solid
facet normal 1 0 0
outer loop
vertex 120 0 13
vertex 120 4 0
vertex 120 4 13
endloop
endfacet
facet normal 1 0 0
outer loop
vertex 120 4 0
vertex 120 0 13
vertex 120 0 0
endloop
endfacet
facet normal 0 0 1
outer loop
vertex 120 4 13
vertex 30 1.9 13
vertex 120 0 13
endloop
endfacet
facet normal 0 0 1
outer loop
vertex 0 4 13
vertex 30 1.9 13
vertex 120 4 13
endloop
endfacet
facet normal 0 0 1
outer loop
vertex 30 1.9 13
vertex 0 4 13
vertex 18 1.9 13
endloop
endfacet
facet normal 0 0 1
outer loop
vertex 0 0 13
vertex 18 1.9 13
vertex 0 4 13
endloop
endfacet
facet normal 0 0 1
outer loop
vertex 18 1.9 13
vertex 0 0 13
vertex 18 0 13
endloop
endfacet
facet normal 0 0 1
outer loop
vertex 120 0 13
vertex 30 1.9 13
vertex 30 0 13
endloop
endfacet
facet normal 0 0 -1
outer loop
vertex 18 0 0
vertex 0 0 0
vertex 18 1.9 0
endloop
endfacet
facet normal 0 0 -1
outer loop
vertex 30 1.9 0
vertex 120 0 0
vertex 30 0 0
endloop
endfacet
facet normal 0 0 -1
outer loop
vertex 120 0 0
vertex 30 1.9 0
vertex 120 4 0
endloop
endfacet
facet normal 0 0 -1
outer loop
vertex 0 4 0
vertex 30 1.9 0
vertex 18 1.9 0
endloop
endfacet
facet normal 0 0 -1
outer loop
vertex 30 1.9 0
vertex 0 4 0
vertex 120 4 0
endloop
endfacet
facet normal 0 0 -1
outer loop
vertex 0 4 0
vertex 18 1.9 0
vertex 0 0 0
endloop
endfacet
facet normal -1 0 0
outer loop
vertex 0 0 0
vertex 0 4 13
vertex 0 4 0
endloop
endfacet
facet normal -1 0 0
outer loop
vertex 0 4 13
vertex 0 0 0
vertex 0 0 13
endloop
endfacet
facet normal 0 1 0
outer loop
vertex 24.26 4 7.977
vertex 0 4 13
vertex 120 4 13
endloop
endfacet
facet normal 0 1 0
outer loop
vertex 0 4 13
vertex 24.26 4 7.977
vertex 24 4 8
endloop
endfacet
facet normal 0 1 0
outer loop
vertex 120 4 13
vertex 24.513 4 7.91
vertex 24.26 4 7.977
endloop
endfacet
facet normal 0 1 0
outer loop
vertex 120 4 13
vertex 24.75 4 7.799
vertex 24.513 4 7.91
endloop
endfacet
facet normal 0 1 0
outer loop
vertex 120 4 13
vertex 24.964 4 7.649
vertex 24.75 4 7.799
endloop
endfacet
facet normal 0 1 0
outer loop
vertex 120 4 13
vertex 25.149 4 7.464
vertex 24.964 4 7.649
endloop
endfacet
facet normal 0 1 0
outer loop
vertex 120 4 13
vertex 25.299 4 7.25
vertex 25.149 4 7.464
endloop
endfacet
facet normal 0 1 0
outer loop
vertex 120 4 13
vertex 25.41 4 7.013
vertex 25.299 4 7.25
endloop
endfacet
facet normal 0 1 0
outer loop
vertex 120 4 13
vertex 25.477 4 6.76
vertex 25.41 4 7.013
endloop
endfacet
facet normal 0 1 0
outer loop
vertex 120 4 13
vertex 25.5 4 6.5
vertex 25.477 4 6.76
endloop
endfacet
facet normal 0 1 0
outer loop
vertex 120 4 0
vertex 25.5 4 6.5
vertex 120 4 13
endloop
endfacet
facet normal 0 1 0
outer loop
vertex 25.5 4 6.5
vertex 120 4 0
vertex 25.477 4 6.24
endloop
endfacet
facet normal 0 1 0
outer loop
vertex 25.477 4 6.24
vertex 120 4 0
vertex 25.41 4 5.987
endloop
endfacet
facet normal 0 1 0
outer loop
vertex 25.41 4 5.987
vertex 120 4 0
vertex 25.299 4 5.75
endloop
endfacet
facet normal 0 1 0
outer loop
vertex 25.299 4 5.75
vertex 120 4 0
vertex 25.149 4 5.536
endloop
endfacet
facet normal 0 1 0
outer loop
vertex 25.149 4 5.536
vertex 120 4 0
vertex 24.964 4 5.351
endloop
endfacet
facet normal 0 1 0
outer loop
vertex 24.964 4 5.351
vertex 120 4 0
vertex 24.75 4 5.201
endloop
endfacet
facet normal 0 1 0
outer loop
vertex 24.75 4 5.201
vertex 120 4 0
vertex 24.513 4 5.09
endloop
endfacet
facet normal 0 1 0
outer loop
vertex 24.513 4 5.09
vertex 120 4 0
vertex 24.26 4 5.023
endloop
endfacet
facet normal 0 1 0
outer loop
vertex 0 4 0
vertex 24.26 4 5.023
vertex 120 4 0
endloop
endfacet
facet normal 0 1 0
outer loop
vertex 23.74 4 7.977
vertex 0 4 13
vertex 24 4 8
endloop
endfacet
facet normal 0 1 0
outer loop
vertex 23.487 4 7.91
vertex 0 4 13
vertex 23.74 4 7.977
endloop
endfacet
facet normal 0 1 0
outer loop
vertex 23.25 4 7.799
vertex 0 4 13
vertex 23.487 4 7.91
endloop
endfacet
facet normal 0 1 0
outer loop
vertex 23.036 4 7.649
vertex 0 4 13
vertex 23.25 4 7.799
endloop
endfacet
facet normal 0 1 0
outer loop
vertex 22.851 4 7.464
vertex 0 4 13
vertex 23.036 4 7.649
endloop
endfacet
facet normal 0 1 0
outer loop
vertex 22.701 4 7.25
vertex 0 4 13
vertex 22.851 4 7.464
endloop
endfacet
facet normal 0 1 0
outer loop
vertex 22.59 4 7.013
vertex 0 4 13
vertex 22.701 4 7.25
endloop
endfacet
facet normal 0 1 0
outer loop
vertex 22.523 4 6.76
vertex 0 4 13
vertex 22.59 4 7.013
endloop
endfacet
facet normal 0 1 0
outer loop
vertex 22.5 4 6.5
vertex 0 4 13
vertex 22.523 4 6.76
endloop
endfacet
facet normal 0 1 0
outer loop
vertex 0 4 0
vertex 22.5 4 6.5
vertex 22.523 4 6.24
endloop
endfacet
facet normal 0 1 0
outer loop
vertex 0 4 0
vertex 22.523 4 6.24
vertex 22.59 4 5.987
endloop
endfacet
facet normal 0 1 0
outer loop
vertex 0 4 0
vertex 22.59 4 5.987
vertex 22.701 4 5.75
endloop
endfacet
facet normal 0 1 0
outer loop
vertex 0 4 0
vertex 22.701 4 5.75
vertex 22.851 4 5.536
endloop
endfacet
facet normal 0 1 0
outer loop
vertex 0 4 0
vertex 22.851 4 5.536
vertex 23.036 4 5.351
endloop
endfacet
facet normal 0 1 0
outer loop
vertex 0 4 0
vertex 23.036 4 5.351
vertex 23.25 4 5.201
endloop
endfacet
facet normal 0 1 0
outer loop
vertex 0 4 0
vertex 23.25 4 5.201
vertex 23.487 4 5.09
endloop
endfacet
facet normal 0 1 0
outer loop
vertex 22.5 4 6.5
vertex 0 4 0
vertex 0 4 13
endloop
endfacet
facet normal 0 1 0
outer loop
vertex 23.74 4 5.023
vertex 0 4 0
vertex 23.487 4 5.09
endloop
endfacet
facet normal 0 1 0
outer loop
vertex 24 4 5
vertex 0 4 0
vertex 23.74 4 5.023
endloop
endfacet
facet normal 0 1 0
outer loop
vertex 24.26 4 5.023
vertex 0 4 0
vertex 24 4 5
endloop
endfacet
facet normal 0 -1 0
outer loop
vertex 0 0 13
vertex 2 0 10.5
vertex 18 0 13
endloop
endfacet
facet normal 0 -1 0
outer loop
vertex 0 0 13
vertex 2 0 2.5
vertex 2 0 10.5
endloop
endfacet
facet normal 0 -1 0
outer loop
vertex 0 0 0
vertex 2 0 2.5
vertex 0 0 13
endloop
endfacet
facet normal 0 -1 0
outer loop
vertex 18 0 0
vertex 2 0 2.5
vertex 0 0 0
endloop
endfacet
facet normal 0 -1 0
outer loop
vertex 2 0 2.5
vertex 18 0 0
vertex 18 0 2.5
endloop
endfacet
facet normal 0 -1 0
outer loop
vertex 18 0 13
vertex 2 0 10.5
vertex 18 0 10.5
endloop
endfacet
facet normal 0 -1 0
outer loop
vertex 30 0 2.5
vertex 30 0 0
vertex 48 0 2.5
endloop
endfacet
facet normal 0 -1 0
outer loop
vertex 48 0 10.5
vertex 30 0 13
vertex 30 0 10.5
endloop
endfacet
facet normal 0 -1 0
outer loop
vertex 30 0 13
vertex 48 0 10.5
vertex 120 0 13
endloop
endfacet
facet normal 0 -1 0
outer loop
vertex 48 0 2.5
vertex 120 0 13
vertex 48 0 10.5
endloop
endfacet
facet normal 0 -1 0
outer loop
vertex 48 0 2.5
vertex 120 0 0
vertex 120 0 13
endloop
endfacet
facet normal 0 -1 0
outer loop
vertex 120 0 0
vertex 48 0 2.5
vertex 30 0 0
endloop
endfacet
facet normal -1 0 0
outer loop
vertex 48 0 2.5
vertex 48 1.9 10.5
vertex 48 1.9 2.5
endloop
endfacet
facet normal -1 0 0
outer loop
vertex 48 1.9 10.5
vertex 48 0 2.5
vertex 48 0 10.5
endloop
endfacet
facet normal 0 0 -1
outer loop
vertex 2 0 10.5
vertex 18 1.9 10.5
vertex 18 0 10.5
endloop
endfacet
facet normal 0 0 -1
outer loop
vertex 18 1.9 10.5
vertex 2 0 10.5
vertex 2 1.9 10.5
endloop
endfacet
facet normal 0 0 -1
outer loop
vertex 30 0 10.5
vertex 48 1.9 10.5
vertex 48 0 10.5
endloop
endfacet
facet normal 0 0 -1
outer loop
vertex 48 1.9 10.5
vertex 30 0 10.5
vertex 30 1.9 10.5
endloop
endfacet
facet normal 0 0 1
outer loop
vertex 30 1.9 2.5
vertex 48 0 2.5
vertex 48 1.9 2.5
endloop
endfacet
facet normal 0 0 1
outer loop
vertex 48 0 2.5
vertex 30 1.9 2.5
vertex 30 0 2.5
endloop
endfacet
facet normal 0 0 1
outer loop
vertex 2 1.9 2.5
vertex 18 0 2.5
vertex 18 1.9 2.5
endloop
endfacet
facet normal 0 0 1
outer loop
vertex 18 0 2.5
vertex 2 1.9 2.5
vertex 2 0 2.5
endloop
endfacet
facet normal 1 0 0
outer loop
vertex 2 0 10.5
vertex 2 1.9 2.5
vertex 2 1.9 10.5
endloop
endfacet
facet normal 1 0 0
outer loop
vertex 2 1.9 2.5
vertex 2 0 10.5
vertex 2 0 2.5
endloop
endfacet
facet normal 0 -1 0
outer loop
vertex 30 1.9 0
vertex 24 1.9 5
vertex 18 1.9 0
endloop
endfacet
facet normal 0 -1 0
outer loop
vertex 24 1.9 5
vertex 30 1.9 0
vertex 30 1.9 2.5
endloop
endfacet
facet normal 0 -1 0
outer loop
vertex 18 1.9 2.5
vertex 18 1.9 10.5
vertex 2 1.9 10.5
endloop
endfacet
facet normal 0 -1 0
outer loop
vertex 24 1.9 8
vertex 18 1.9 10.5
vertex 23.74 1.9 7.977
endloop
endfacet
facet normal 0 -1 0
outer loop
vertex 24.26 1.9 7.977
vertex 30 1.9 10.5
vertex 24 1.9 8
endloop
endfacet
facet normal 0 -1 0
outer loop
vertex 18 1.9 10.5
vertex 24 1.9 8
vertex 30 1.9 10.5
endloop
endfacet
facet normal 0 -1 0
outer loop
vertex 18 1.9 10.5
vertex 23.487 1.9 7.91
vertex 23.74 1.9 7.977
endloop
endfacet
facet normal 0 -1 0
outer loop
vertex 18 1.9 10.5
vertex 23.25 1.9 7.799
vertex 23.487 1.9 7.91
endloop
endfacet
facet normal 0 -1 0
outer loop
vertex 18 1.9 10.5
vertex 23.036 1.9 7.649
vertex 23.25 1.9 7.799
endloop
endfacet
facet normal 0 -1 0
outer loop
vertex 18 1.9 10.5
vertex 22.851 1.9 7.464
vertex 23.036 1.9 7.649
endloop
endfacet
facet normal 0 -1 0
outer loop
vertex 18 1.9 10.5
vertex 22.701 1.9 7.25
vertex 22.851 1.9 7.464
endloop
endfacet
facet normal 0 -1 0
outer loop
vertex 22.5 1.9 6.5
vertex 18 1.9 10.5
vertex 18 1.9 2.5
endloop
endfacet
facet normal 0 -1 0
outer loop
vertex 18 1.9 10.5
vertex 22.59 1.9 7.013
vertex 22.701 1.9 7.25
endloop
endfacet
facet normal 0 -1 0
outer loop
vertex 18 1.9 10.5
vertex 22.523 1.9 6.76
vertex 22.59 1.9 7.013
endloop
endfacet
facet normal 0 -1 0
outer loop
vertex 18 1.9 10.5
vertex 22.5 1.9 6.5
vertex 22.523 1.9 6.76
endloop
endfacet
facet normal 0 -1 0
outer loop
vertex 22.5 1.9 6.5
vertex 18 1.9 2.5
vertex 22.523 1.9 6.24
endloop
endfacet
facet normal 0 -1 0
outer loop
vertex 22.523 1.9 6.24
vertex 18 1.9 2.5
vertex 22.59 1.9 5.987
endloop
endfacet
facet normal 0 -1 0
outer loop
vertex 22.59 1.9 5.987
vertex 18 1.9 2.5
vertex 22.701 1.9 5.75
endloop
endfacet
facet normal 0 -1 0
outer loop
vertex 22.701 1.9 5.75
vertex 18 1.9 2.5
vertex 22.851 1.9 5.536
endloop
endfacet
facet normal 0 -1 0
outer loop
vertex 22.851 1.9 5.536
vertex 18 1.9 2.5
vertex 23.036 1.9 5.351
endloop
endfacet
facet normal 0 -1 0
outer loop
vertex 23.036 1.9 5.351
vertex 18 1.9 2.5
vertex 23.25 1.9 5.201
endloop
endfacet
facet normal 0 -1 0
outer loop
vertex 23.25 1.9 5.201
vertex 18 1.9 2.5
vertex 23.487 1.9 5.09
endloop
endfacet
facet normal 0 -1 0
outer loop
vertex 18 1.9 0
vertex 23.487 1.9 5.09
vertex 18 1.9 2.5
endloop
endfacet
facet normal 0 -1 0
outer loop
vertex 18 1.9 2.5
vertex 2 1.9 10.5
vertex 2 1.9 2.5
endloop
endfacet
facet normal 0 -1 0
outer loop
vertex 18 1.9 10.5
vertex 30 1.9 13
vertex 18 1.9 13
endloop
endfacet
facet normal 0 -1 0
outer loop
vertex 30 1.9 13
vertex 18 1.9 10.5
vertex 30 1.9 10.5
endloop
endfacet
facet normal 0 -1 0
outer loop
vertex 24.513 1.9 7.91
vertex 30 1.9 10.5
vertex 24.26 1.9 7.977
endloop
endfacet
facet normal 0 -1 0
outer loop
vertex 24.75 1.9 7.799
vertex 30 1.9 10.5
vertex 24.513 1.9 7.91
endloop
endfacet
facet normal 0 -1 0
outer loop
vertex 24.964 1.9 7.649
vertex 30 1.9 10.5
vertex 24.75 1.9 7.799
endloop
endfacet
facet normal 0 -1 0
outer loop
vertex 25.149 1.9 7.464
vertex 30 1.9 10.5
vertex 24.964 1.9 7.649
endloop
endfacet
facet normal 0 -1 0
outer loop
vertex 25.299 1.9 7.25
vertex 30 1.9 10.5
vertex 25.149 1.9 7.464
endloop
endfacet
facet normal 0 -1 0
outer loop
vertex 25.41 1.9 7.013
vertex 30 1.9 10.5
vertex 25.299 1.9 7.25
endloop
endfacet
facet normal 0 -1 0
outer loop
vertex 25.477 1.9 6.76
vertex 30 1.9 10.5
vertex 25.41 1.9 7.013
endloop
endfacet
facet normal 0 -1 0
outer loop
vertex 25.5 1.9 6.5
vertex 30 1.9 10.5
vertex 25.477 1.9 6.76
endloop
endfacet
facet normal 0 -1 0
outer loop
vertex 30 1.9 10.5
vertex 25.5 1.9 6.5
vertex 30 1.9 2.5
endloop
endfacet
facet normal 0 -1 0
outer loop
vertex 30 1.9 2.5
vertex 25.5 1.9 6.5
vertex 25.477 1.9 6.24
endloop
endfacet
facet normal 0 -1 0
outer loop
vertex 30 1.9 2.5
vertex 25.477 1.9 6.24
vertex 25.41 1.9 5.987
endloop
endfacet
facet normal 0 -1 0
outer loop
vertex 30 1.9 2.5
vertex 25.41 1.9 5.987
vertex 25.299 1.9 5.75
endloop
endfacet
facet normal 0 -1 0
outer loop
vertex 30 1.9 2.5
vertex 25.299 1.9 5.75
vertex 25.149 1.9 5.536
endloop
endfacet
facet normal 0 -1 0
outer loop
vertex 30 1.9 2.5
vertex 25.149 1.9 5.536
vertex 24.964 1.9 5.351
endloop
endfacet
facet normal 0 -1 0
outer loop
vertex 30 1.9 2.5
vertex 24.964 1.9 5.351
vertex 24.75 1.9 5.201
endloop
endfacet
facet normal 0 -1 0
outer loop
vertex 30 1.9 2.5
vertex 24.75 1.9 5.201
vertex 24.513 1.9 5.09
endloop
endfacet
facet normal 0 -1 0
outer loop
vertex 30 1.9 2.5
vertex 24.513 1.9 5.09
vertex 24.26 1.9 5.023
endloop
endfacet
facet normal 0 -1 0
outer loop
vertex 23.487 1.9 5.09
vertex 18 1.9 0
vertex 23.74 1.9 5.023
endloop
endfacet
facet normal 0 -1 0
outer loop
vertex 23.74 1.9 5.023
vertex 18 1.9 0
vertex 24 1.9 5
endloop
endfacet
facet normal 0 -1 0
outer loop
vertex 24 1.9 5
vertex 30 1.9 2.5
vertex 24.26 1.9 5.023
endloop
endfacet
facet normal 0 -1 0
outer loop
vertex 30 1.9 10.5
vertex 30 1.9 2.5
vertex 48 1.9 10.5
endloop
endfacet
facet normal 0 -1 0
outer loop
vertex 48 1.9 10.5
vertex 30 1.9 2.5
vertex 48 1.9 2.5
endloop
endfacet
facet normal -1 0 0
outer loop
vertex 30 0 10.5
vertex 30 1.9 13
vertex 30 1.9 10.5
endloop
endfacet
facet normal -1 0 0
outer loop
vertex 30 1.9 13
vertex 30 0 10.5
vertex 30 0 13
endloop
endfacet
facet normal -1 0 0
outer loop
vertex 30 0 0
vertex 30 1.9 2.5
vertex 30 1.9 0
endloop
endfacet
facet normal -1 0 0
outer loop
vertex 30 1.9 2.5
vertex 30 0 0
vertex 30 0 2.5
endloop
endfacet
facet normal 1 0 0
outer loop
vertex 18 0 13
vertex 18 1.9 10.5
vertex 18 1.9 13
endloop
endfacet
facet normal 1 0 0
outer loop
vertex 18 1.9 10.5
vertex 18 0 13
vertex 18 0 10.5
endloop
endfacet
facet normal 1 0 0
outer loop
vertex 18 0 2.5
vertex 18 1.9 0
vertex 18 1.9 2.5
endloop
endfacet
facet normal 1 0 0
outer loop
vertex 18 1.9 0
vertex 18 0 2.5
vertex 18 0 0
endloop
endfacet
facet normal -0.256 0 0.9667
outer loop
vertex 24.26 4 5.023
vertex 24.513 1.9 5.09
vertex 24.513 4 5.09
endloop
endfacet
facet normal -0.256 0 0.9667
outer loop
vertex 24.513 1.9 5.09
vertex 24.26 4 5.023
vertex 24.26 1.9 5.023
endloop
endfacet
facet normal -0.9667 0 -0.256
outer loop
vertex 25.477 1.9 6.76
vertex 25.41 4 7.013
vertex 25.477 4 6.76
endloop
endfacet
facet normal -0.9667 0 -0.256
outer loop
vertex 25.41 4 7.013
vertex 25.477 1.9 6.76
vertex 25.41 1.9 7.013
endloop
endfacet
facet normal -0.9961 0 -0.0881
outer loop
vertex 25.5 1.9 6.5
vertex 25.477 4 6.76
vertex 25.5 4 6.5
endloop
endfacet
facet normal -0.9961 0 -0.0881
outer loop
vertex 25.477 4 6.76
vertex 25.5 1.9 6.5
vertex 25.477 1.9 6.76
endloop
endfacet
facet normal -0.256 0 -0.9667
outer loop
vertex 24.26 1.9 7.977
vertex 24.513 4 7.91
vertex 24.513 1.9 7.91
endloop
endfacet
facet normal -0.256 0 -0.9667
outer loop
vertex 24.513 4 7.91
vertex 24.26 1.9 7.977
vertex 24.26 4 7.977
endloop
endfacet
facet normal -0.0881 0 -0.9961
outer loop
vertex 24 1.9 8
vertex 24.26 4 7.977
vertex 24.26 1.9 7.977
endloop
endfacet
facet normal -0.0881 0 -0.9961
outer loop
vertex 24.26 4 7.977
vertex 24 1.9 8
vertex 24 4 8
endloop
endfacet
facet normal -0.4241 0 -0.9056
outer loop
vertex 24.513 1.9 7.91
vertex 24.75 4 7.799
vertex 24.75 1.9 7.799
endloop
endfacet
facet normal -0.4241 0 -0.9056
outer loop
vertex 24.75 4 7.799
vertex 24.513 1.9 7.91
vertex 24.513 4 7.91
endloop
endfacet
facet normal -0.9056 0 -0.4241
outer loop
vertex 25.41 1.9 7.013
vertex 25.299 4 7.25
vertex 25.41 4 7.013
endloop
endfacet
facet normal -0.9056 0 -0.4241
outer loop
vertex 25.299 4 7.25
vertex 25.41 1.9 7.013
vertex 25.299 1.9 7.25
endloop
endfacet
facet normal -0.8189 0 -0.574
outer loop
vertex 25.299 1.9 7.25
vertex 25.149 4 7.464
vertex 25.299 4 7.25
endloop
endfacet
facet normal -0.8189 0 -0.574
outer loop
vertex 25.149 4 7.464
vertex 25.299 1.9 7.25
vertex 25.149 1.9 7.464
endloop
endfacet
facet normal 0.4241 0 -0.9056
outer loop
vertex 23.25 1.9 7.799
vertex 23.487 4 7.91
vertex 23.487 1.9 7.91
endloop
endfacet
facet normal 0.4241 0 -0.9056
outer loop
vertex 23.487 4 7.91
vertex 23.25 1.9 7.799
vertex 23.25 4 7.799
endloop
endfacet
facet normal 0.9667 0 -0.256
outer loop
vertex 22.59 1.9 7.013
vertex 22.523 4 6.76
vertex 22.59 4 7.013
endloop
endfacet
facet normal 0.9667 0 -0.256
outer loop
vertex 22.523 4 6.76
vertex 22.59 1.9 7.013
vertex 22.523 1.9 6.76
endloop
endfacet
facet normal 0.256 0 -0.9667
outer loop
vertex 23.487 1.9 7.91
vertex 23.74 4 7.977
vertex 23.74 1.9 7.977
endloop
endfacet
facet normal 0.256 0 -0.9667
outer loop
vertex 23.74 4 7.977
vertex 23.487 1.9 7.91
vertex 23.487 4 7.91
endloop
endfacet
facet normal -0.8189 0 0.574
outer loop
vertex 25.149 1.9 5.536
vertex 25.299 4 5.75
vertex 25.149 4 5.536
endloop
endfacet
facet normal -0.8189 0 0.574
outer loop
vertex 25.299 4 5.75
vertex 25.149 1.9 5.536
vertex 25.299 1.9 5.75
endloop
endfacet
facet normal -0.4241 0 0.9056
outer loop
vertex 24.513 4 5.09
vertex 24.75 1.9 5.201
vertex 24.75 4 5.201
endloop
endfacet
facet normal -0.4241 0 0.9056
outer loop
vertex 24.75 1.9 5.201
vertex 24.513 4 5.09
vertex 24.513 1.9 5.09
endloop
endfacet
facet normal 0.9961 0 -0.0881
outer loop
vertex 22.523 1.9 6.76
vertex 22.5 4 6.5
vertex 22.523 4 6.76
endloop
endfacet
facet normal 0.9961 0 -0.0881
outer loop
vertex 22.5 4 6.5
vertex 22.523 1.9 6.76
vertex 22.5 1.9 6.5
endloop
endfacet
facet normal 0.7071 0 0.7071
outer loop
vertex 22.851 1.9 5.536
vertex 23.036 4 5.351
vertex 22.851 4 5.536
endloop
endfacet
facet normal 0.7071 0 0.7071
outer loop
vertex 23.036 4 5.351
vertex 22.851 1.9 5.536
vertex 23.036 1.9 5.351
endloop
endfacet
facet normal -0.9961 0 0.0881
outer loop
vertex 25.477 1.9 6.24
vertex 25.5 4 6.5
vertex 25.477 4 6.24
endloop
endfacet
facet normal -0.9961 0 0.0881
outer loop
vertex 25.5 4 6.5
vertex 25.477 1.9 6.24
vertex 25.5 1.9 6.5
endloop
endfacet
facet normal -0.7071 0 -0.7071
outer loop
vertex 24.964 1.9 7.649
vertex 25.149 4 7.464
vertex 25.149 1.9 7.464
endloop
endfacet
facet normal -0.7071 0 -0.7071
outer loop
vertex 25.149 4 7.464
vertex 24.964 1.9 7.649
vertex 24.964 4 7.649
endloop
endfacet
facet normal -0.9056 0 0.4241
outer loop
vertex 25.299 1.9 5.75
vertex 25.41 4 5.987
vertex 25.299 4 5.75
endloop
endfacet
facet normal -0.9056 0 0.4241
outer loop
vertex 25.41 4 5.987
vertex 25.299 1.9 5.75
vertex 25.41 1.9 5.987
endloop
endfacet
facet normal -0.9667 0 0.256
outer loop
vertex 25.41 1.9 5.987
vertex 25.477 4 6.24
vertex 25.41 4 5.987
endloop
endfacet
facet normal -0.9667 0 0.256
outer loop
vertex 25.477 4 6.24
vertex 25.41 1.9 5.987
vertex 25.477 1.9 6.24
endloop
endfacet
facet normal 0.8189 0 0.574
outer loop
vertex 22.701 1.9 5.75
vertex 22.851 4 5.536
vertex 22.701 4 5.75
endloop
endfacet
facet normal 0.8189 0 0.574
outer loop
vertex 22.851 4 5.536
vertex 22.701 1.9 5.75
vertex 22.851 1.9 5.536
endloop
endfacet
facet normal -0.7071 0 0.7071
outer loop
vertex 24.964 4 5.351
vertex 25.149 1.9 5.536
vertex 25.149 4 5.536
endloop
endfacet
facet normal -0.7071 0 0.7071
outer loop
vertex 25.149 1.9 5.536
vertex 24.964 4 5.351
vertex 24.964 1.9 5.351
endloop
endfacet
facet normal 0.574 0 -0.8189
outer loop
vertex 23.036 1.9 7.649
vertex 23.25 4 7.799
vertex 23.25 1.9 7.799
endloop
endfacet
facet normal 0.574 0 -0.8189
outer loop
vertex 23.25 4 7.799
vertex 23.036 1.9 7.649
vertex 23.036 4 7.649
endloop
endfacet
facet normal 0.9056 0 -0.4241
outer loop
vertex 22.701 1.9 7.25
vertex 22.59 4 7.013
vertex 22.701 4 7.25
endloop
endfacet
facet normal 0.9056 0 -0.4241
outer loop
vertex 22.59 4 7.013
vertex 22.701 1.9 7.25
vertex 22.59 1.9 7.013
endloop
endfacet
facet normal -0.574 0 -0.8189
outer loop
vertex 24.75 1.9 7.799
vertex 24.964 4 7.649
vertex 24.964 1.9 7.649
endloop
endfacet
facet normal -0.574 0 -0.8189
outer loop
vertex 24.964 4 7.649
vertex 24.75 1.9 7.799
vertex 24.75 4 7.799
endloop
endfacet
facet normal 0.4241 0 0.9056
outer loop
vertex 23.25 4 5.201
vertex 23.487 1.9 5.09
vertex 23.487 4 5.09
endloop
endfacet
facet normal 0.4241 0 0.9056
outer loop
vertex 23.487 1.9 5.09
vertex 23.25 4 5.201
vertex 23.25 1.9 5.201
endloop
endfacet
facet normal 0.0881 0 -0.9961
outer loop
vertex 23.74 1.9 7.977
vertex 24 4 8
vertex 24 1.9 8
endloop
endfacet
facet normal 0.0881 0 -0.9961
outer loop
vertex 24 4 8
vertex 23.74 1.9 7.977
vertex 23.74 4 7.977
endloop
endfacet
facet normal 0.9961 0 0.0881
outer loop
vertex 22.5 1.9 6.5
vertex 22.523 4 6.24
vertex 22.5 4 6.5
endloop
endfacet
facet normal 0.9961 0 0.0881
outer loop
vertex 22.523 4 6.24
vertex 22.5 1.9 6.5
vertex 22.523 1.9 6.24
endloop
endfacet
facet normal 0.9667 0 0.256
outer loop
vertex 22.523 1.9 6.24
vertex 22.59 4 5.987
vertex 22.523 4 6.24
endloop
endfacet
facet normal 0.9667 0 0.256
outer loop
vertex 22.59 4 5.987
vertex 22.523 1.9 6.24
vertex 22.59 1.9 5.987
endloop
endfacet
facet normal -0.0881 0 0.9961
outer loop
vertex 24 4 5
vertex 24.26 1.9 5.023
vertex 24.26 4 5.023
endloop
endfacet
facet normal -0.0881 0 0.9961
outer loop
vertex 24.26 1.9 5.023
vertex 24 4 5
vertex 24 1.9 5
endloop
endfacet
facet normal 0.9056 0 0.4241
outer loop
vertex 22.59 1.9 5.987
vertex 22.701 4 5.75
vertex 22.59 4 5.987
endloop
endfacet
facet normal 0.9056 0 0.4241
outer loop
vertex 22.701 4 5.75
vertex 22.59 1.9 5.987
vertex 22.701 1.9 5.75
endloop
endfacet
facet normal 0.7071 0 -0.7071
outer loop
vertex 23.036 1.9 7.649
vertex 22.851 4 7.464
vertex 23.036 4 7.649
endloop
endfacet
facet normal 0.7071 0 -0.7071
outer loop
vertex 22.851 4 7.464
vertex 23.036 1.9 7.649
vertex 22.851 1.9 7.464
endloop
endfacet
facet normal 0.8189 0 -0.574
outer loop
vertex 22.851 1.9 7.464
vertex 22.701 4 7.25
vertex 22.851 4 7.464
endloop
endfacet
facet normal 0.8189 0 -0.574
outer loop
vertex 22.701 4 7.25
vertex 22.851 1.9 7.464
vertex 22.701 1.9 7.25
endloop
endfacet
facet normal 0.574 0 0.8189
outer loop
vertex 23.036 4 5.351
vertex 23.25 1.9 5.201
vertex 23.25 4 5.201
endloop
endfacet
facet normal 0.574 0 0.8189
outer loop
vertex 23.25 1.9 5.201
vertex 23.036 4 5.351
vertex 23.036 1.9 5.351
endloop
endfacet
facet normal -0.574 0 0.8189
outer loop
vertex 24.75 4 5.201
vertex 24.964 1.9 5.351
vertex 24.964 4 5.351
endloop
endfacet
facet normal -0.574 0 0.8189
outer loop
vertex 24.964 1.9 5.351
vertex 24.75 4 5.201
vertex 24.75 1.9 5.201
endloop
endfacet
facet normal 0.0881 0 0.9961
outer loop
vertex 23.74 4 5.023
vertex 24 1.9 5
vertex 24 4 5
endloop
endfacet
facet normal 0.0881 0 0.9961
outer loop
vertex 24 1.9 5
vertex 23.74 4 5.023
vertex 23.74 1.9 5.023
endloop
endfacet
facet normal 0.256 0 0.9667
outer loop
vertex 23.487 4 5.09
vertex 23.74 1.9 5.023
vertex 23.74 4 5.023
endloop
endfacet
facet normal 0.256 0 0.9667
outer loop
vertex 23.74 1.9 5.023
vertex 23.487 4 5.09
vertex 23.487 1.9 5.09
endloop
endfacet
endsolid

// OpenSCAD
// arm

$fn=36;
difference() {
    cube([120,4,13]);
    translate([2,-0.1,2.5])
    cube([46,2,8]);
    translate([18,-0.1,-1])
    cube([12,2,15]);
    color("red")
    rotate([90,0,0])
    translate([24,6.5,-5])
    cylinder(8,1.5,1.5);
}
